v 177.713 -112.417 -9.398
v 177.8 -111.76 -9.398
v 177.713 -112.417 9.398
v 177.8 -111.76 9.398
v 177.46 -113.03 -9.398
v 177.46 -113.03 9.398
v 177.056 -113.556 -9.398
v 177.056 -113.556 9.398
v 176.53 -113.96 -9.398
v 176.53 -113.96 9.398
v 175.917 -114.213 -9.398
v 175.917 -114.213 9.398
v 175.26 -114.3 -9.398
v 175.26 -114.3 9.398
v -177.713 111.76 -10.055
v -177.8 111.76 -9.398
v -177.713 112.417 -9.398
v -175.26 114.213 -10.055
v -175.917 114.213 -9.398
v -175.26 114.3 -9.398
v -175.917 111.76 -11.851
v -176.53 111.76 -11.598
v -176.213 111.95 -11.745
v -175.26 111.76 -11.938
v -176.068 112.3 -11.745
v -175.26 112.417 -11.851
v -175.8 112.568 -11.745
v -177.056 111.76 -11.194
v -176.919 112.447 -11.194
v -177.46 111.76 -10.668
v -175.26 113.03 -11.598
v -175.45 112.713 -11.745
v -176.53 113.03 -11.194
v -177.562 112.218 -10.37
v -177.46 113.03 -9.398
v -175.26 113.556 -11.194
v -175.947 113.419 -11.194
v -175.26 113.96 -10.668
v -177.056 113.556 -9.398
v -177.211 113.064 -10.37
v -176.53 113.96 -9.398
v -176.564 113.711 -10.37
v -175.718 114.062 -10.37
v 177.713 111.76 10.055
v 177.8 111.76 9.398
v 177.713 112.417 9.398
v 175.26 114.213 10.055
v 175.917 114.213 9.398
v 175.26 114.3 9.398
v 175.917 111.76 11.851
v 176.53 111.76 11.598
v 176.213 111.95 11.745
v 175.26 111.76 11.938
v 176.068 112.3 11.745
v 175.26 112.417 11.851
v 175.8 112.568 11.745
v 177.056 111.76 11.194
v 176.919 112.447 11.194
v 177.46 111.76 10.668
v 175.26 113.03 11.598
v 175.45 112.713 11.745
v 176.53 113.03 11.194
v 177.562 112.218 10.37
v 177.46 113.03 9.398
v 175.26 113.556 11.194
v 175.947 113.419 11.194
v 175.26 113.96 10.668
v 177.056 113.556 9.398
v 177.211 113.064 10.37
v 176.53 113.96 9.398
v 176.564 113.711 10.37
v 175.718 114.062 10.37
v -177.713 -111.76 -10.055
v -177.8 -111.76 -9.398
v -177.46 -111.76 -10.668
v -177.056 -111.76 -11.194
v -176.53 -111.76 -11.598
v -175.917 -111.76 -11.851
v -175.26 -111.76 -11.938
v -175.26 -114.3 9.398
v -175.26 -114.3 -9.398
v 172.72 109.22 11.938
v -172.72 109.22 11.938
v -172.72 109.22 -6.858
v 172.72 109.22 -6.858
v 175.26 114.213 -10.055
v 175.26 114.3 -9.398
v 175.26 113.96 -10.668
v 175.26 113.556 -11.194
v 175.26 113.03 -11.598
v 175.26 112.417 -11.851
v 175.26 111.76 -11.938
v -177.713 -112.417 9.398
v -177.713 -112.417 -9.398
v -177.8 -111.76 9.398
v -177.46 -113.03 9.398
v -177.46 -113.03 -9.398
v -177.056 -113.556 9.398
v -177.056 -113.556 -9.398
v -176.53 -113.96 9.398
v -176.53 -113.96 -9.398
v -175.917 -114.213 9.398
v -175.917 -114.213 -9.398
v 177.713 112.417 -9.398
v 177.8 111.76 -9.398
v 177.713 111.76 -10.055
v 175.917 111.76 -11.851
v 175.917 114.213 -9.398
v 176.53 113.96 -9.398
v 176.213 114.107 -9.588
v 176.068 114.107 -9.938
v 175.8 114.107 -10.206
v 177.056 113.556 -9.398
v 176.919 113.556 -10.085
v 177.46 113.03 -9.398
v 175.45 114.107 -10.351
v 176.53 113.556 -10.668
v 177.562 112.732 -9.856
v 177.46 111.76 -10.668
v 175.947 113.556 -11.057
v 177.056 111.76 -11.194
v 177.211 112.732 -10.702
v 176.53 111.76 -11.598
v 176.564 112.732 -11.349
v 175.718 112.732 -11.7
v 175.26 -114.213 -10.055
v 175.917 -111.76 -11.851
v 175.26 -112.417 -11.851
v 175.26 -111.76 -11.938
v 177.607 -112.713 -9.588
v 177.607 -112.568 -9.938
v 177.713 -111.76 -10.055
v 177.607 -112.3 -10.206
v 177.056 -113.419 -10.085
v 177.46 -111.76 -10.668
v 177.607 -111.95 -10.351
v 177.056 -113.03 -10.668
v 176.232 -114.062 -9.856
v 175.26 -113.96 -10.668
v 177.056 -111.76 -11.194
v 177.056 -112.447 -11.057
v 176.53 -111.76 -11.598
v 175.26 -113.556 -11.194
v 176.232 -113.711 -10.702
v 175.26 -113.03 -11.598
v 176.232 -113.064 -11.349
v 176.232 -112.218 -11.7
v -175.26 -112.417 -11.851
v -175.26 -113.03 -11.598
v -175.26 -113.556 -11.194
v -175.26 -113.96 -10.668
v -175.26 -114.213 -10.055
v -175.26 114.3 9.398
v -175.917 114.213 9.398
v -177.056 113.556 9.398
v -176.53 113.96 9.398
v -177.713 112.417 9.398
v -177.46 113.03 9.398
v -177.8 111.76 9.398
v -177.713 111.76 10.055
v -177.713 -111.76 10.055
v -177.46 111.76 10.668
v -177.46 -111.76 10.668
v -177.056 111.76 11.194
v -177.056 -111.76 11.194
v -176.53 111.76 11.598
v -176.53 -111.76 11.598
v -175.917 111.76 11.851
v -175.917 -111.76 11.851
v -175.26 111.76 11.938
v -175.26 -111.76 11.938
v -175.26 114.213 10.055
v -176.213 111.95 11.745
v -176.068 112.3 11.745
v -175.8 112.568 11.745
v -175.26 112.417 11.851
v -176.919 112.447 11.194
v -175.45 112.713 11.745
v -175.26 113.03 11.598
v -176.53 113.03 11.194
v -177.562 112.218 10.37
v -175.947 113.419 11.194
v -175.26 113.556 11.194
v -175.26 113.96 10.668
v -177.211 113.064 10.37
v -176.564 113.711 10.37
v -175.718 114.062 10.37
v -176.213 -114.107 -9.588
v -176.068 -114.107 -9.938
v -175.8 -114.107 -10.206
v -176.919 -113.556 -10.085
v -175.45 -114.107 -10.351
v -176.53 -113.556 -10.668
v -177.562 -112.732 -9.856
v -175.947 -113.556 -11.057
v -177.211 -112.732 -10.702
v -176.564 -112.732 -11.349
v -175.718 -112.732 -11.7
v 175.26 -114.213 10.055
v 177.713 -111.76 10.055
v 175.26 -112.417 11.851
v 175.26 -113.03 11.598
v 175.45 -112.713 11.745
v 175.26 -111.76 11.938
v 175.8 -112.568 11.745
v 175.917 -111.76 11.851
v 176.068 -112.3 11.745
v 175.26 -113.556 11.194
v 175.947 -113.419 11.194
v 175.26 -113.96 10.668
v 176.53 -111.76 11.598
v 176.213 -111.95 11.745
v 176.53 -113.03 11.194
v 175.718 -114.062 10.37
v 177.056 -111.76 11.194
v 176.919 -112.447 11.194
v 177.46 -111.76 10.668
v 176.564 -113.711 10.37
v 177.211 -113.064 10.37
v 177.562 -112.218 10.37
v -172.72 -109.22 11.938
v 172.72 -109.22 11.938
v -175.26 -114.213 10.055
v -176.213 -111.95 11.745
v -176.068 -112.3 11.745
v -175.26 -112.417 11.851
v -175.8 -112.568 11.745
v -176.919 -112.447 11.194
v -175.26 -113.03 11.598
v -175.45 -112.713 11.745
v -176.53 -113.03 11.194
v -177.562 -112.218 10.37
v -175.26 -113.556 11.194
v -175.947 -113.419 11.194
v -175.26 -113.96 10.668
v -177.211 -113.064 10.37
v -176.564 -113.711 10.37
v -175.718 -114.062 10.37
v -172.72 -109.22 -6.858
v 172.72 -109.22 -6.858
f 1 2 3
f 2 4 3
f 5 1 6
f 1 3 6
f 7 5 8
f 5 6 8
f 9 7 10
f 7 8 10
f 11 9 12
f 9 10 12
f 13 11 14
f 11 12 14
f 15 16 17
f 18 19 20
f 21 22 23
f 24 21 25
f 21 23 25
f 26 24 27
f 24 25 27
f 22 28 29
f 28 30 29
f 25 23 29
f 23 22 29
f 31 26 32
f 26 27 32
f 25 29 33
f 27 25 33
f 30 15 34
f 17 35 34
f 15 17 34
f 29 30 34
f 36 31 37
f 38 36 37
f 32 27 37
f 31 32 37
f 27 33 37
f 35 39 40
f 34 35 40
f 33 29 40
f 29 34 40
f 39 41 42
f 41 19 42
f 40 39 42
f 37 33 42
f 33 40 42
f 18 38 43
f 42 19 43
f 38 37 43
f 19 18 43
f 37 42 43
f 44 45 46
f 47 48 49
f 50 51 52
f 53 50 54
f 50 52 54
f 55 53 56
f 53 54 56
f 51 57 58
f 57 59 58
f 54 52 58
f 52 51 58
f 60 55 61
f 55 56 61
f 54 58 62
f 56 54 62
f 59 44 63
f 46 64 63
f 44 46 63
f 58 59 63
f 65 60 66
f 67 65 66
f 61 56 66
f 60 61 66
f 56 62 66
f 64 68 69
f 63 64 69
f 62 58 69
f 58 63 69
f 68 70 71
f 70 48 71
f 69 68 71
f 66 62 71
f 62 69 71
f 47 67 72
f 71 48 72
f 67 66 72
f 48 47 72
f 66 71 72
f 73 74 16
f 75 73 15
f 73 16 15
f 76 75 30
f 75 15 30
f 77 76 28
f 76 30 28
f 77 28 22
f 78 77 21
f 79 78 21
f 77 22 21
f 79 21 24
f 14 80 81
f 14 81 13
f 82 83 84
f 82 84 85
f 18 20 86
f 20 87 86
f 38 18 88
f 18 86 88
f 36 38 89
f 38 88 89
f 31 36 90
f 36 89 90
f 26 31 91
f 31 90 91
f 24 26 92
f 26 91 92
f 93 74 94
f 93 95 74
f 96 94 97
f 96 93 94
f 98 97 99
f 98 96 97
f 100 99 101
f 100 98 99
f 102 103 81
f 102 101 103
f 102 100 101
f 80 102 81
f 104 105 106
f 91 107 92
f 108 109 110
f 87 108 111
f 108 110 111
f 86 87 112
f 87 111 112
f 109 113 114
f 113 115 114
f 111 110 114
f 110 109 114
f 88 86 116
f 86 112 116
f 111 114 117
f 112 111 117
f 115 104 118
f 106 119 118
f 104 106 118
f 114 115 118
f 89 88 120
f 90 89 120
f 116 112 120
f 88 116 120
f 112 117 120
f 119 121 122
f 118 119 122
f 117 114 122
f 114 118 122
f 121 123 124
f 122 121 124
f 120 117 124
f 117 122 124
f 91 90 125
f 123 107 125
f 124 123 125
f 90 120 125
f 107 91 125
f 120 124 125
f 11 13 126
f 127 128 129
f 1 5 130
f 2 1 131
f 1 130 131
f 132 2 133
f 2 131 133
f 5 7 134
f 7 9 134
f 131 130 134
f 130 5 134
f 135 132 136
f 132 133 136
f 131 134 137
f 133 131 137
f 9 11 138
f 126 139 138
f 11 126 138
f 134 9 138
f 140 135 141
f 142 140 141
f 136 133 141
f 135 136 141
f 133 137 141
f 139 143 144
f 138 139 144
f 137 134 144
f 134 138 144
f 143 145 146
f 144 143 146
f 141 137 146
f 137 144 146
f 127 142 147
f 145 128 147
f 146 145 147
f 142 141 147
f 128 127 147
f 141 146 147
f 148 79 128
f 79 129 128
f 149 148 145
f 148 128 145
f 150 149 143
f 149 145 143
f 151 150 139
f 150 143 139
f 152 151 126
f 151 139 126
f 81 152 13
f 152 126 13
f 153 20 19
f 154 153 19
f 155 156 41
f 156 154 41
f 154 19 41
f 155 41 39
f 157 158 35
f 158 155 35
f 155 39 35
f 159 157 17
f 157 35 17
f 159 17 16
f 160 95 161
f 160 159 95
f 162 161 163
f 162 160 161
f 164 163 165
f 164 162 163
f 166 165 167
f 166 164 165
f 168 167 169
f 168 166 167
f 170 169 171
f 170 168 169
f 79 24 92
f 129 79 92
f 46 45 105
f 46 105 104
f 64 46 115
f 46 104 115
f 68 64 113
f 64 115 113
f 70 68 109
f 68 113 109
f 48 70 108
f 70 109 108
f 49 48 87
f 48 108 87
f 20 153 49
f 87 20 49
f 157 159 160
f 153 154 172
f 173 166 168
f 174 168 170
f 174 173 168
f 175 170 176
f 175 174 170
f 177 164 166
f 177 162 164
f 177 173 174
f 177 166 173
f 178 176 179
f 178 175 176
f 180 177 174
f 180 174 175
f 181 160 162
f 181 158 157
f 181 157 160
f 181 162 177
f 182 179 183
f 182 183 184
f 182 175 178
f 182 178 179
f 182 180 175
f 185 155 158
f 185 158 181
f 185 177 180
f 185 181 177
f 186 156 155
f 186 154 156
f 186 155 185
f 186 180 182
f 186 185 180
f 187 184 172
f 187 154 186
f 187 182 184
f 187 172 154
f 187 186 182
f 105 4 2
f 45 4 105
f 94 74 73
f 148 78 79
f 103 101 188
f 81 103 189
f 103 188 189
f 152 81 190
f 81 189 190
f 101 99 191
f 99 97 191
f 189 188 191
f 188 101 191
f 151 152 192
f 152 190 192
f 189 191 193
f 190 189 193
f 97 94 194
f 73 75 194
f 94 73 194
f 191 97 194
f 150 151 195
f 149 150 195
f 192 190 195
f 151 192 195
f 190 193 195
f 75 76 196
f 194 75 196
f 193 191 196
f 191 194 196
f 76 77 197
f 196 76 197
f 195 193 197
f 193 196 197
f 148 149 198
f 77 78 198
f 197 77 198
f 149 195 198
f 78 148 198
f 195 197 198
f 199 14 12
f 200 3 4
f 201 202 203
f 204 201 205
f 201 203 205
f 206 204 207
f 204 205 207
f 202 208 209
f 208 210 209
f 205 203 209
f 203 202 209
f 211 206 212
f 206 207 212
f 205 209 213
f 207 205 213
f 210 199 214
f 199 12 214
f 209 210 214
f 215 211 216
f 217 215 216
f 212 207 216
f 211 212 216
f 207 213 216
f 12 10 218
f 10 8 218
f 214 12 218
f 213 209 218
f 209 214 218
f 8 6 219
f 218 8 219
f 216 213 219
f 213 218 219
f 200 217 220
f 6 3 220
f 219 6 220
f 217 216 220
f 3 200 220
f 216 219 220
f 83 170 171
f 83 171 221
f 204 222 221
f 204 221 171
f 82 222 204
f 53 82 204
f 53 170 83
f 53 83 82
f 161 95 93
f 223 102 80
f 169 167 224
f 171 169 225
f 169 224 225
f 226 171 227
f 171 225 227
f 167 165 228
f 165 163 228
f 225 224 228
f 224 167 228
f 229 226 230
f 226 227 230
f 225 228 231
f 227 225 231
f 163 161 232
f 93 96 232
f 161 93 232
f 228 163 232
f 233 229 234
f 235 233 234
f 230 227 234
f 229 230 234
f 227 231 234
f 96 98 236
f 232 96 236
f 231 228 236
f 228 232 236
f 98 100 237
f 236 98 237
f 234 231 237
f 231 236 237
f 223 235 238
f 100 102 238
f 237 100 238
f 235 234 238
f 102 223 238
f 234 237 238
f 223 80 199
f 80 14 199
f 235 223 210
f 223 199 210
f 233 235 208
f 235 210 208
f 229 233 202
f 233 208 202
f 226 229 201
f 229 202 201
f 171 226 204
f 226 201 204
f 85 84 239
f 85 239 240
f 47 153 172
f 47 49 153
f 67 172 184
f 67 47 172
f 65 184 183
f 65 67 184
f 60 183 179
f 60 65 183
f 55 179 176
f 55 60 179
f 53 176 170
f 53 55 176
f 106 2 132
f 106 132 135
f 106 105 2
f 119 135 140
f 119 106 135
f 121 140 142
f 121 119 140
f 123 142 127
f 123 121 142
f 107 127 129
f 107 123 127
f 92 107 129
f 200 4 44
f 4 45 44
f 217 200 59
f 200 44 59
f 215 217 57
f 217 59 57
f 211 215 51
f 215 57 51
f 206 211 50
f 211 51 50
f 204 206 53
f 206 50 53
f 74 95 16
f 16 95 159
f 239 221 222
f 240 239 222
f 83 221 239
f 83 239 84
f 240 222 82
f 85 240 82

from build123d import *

# Parameters (mm, degrees)
F0_W     = 355.6
F0_H     = 228.6
F1_DEPTH = 11.938
F2_T     = -5.08
F3_R     = 2.54


with BuildPart() as f1:
    # F0 (on Top) → F1 (new body, symmetric)
    with BuildSketch(Plane.XY):
        Rectangle(F0_W, F0_H)
    extrude(amount=F1_DEPTH, both=True)

    # F2
    f2_openings = [f1.faces().sort_by_distance(p)[0] for p in [
        (0, 0, 11.938),
    ]]
    offset(amount=F2_T, openings=f2_openings)

    # F3
    f3_edges = [f1.edges().sort_by_distance(p)[0] for p in [
        (-177.8, 114.3, 0),
        (-177.8, 0, -11.938),
        (-177.8, -114.3, 0),
        (-177.8, 0, 11.938),
        (0, -114.3, -11.938),
        (177.8, -114.3, 0),
        (0, -114.3, 11.938),
        (177.8, 0, -11.938),
        (177.8, 114.3, 0),
        (177.8, 0, 11.938),
        (0, 114.3, -11.938),
        (0, 114.3, 11.938),
    ]]
    fillet(f3_edges, radius=F3_R)


solid = f1.part
